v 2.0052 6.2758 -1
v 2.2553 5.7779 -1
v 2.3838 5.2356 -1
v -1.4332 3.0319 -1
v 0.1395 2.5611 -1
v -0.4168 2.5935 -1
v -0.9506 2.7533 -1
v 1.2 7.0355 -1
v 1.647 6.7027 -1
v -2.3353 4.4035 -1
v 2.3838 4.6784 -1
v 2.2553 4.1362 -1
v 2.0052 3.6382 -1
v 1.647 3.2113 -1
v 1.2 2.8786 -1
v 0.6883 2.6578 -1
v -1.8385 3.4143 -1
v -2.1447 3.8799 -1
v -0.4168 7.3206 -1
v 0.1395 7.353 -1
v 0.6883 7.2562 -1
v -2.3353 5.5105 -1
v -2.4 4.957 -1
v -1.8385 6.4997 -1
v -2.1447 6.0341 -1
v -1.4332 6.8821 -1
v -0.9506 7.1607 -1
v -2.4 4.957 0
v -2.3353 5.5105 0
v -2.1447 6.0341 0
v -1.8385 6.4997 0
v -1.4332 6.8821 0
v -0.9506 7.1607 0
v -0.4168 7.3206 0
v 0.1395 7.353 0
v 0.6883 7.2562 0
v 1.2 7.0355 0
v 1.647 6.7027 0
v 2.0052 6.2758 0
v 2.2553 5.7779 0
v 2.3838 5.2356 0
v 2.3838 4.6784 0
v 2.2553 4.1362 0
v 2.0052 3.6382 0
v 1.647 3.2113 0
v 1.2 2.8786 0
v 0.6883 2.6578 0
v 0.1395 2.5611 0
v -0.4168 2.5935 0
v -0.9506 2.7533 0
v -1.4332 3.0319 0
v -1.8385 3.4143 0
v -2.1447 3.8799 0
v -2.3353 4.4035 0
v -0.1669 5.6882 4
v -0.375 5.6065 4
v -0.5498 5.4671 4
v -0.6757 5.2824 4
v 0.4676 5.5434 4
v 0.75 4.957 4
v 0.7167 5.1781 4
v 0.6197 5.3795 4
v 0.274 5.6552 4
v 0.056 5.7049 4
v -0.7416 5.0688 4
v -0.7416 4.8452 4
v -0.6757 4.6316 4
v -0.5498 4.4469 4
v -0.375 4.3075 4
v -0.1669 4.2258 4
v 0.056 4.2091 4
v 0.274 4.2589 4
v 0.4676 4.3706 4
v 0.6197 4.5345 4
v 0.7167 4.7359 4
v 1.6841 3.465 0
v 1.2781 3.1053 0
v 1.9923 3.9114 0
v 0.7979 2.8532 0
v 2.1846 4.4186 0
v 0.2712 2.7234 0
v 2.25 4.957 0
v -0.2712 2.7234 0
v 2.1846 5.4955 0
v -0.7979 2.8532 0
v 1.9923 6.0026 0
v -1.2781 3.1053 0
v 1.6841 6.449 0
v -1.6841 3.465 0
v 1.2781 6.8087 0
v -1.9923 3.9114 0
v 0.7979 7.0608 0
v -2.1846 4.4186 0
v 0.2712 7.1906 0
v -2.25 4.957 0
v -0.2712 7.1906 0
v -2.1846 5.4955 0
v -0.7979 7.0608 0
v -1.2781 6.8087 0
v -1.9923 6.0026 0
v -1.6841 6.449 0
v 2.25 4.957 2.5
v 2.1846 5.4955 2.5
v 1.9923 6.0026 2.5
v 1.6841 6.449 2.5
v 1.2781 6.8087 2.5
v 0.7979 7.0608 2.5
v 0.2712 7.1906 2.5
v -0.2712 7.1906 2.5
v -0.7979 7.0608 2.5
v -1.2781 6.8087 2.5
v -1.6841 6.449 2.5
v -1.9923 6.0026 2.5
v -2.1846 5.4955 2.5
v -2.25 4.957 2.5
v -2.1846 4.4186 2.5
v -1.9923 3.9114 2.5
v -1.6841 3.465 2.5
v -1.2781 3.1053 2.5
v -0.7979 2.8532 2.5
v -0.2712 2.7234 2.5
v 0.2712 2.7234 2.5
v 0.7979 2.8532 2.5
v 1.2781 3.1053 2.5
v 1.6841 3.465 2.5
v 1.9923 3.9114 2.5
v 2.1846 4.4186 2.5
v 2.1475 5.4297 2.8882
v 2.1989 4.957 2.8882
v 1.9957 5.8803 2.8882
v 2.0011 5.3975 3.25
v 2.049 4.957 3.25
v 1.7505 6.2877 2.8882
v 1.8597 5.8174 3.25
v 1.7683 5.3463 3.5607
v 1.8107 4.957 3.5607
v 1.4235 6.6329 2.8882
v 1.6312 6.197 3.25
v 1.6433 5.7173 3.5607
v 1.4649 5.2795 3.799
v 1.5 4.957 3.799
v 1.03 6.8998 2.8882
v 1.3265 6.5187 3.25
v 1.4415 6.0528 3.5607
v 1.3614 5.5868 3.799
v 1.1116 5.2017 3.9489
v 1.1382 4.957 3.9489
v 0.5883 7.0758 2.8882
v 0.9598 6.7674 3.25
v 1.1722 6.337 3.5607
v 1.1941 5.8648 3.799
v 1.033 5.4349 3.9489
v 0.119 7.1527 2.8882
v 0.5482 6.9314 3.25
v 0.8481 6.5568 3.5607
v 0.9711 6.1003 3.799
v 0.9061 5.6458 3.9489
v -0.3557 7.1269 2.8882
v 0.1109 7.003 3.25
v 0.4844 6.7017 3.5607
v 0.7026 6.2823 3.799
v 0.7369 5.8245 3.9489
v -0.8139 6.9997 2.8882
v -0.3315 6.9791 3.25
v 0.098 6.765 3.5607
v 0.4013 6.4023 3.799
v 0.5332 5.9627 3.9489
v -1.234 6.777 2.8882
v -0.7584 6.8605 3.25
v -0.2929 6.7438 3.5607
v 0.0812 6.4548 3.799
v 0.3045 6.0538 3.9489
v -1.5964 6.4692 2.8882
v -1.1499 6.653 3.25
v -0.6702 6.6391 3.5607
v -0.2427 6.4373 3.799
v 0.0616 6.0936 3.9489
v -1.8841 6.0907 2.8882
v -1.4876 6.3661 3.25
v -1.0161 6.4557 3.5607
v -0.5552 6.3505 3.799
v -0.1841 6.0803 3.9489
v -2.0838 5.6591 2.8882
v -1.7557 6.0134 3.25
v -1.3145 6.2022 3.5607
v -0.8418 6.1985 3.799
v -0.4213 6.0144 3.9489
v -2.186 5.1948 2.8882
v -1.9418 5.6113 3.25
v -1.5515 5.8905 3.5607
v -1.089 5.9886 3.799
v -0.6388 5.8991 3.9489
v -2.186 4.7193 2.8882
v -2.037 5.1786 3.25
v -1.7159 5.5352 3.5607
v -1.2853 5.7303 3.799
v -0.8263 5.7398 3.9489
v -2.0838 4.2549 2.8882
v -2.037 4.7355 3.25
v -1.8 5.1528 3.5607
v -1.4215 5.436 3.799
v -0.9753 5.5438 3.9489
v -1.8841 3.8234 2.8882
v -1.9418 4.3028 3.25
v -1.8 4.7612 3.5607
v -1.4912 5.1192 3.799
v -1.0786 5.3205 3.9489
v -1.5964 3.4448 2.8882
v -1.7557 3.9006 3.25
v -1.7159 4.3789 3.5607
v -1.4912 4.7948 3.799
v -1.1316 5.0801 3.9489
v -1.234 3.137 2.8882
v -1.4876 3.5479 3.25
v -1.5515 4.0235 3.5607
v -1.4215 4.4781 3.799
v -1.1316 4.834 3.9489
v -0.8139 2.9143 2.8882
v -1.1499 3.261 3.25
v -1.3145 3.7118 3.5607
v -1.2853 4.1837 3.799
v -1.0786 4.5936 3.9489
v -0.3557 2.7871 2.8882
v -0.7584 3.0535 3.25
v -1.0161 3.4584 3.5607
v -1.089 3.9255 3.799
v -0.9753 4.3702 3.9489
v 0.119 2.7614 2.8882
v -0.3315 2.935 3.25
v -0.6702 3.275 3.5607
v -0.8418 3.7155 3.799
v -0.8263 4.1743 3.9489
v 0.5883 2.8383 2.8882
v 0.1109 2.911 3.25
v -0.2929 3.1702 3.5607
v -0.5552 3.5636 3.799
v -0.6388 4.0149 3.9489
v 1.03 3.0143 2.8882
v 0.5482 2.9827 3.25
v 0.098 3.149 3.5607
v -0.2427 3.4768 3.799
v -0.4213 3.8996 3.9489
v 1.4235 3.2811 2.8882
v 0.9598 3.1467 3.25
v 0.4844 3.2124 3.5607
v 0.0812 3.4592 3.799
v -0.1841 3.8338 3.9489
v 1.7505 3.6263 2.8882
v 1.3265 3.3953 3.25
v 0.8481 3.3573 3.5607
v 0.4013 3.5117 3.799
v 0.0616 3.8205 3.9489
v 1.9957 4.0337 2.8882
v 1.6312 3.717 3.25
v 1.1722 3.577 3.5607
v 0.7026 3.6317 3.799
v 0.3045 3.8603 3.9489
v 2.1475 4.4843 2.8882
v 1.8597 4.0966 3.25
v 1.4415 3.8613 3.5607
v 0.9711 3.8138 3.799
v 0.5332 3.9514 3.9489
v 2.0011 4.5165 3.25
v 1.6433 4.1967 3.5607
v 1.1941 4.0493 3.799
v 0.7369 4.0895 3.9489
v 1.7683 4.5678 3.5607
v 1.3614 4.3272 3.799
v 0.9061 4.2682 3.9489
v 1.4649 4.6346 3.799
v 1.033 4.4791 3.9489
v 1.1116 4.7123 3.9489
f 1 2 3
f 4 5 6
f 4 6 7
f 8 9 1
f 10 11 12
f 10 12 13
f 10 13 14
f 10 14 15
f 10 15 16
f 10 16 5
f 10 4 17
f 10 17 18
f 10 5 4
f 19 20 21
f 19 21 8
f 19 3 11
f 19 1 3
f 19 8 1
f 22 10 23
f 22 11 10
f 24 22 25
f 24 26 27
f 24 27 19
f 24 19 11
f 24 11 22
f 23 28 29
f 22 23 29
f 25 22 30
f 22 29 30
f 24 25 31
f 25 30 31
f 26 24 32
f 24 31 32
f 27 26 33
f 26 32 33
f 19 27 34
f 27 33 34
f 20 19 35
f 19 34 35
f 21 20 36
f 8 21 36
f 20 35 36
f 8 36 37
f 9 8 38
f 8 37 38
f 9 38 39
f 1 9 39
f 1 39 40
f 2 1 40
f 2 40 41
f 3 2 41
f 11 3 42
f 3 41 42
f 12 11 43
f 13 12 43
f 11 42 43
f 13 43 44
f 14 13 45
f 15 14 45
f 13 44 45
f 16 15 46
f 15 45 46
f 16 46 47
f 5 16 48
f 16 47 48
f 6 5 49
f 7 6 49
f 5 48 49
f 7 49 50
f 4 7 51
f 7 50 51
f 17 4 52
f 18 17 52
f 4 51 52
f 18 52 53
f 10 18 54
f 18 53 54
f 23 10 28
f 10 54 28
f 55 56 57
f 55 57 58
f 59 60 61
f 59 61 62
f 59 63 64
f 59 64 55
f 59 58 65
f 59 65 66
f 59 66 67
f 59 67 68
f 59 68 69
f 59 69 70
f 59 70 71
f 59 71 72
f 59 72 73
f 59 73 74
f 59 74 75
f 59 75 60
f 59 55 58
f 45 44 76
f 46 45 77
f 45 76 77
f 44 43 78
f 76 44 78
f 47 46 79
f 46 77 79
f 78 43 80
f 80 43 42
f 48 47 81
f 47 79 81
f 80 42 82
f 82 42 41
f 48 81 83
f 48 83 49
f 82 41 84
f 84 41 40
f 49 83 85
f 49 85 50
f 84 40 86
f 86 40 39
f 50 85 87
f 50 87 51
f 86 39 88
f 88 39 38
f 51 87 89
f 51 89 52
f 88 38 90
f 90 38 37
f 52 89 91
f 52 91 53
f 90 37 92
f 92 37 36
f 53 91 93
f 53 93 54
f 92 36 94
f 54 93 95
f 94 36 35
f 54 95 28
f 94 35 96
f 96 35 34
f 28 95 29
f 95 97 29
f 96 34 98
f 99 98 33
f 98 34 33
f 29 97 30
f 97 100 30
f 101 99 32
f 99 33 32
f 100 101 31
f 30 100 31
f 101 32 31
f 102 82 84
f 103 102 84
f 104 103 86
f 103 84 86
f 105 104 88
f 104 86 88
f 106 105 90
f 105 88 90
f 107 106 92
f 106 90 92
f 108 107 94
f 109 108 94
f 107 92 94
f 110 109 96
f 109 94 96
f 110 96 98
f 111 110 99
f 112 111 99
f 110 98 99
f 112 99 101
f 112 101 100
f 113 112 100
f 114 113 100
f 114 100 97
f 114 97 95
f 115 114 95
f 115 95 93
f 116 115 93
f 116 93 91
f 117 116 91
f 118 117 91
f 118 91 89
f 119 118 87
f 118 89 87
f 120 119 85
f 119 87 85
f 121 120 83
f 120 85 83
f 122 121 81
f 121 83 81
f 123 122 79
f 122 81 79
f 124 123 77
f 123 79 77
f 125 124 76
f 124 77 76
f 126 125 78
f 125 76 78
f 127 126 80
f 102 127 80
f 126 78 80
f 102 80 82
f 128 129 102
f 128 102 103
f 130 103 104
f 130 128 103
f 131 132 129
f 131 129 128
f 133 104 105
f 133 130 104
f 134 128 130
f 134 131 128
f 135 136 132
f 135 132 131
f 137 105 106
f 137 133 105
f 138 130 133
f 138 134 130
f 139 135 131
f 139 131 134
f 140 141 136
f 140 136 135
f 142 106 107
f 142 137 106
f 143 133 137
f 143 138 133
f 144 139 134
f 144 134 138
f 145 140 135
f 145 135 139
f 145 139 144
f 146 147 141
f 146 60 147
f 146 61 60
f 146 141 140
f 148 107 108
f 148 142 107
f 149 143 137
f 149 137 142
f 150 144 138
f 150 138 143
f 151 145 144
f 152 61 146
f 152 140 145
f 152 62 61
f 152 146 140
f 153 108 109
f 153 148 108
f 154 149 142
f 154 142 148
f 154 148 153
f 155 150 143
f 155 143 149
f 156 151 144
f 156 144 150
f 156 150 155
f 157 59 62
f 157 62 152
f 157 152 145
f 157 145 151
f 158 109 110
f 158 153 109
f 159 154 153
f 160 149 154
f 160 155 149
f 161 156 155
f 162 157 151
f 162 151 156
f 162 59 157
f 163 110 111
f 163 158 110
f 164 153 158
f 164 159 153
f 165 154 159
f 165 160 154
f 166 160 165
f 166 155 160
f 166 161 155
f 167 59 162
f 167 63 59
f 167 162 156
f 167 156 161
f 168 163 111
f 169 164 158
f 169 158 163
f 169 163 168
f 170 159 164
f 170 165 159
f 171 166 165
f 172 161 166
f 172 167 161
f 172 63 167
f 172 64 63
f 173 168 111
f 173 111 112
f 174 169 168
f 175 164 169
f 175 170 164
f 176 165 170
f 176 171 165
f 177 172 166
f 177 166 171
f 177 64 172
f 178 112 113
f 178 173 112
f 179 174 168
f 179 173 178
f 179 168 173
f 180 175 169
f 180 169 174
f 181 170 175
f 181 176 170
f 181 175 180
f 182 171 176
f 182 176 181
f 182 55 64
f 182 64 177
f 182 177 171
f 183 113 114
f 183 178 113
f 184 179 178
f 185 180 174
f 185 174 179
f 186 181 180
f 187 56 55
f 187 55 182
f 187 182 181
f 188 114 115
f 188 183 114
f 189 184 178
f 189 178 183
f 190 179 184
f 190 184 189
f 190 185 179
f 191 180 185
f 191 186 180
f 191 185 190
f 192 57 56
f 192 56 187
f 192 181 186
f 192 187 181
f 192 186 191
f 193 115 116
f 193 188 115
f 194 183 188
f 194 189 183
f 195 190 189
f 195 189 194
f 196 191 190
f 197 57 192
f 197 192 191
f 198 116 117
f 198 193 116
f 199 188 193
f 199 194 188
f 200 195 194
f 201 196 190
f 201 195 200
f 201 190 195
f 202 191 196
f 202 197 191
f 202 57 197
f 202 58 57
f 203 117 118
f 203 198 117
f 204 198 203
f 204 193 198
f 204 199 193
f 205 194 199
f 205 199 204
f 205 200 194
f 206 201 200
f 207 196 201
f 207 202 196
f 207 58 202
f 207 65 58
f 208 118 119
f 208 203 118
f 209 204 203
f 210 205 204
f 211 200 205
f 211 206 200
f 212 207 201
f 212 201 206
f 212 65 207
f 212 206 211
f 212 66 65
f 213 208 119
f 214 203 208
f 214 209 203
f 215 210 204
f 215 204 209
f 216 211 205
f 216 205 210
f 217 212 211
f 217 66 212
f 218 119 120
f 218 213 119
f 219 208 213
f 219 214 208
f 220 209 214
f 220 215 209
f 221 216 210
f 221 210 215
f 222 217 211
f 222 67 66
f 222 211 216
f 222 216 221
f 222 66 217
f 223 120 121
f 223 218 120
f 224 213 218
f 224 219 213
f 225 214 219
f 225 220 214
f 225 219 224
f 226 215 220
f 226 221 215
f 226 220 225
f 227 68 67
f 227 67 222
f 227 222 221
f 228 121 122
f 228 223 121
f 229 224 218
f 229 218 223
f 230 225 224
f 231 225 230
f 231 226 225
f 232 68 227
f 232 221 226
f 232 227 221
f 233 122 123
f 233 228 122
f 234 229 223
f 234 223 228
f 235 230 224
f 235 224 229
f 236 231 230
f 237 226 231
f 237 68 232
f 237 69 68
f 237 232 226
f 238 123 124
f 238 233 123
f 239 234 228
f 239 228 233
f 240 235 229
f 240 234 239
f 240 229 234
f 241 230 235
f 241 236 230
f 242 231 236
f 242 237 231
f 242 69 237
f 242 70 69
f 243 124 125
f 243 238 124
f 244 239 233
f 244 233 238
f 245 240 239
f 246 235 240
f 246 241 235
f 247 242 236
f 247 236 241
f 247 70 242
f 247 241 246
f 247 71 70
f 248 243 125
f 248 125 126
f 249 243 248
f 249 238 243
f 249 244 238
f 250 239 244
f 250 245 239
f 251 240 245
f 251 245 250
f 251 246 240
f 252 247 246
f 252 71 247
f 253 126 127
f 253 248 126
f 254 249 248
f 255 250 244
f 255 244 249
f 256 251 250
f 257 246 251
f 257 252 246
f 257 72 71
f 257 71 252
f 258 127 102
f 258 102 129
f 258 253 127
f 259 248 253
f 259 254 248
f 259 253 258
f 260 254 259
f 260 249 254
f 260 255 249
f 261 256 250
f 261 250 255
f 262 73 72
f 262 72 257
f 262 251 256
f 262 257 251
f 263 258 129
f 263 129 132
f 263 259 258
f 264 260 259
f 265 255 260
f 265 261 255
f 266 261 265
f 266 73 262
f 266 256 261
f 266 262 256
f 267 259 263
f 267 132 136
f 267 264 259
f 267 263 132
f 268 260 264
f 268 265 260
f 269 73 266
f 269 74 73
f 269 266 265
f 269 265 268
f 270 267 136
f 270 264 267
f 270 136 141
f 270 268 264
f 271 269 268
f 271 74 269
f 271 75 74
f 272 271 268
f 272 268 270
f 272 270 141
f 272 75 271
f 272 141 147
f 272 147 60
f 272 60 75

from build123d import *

# Parameters (mm, degrees)
SKETCH_1_R      = 2.25
EXTRUDE_1_DEPTH = 4
SKETCH_2_R      = 2.4
EXTRUDE_2_DEPTH = 1
FILLET_8_R      = 1.5


with BuildPart() as part:
    # Эскиз1 → Бобышка-Вытянуть1 (new body)
    with BuildSketch(Plane.XY):
        with Locations((0, 4.957015904)):
            Circle(SKETCH_1_R)
    extrude(amount=EXTRUDE_1_DEPTH)

    # Эскиз2 → Бобышка-Вытянуть2 (add)
    with BuildSketch(Plane(origin=(0, 0, 0), x_dir=(-1, 0, 0), z_dir=(0, 0, -1))):
        with Locations((0, 4.957015904)):
            Circle(SKETCH_2_R)
    extrude(amount=EXTRUDE_2_DEPTH)

    # Скругление8
    fillet_8_edges = [part.edges().sort_by_distance(p)[0] for p in [
        (-2.25, 4.957015904, 4),
    ]]
    fillet(fillet_8_edges, radius=FILLET_8_R)


solid = part.part
